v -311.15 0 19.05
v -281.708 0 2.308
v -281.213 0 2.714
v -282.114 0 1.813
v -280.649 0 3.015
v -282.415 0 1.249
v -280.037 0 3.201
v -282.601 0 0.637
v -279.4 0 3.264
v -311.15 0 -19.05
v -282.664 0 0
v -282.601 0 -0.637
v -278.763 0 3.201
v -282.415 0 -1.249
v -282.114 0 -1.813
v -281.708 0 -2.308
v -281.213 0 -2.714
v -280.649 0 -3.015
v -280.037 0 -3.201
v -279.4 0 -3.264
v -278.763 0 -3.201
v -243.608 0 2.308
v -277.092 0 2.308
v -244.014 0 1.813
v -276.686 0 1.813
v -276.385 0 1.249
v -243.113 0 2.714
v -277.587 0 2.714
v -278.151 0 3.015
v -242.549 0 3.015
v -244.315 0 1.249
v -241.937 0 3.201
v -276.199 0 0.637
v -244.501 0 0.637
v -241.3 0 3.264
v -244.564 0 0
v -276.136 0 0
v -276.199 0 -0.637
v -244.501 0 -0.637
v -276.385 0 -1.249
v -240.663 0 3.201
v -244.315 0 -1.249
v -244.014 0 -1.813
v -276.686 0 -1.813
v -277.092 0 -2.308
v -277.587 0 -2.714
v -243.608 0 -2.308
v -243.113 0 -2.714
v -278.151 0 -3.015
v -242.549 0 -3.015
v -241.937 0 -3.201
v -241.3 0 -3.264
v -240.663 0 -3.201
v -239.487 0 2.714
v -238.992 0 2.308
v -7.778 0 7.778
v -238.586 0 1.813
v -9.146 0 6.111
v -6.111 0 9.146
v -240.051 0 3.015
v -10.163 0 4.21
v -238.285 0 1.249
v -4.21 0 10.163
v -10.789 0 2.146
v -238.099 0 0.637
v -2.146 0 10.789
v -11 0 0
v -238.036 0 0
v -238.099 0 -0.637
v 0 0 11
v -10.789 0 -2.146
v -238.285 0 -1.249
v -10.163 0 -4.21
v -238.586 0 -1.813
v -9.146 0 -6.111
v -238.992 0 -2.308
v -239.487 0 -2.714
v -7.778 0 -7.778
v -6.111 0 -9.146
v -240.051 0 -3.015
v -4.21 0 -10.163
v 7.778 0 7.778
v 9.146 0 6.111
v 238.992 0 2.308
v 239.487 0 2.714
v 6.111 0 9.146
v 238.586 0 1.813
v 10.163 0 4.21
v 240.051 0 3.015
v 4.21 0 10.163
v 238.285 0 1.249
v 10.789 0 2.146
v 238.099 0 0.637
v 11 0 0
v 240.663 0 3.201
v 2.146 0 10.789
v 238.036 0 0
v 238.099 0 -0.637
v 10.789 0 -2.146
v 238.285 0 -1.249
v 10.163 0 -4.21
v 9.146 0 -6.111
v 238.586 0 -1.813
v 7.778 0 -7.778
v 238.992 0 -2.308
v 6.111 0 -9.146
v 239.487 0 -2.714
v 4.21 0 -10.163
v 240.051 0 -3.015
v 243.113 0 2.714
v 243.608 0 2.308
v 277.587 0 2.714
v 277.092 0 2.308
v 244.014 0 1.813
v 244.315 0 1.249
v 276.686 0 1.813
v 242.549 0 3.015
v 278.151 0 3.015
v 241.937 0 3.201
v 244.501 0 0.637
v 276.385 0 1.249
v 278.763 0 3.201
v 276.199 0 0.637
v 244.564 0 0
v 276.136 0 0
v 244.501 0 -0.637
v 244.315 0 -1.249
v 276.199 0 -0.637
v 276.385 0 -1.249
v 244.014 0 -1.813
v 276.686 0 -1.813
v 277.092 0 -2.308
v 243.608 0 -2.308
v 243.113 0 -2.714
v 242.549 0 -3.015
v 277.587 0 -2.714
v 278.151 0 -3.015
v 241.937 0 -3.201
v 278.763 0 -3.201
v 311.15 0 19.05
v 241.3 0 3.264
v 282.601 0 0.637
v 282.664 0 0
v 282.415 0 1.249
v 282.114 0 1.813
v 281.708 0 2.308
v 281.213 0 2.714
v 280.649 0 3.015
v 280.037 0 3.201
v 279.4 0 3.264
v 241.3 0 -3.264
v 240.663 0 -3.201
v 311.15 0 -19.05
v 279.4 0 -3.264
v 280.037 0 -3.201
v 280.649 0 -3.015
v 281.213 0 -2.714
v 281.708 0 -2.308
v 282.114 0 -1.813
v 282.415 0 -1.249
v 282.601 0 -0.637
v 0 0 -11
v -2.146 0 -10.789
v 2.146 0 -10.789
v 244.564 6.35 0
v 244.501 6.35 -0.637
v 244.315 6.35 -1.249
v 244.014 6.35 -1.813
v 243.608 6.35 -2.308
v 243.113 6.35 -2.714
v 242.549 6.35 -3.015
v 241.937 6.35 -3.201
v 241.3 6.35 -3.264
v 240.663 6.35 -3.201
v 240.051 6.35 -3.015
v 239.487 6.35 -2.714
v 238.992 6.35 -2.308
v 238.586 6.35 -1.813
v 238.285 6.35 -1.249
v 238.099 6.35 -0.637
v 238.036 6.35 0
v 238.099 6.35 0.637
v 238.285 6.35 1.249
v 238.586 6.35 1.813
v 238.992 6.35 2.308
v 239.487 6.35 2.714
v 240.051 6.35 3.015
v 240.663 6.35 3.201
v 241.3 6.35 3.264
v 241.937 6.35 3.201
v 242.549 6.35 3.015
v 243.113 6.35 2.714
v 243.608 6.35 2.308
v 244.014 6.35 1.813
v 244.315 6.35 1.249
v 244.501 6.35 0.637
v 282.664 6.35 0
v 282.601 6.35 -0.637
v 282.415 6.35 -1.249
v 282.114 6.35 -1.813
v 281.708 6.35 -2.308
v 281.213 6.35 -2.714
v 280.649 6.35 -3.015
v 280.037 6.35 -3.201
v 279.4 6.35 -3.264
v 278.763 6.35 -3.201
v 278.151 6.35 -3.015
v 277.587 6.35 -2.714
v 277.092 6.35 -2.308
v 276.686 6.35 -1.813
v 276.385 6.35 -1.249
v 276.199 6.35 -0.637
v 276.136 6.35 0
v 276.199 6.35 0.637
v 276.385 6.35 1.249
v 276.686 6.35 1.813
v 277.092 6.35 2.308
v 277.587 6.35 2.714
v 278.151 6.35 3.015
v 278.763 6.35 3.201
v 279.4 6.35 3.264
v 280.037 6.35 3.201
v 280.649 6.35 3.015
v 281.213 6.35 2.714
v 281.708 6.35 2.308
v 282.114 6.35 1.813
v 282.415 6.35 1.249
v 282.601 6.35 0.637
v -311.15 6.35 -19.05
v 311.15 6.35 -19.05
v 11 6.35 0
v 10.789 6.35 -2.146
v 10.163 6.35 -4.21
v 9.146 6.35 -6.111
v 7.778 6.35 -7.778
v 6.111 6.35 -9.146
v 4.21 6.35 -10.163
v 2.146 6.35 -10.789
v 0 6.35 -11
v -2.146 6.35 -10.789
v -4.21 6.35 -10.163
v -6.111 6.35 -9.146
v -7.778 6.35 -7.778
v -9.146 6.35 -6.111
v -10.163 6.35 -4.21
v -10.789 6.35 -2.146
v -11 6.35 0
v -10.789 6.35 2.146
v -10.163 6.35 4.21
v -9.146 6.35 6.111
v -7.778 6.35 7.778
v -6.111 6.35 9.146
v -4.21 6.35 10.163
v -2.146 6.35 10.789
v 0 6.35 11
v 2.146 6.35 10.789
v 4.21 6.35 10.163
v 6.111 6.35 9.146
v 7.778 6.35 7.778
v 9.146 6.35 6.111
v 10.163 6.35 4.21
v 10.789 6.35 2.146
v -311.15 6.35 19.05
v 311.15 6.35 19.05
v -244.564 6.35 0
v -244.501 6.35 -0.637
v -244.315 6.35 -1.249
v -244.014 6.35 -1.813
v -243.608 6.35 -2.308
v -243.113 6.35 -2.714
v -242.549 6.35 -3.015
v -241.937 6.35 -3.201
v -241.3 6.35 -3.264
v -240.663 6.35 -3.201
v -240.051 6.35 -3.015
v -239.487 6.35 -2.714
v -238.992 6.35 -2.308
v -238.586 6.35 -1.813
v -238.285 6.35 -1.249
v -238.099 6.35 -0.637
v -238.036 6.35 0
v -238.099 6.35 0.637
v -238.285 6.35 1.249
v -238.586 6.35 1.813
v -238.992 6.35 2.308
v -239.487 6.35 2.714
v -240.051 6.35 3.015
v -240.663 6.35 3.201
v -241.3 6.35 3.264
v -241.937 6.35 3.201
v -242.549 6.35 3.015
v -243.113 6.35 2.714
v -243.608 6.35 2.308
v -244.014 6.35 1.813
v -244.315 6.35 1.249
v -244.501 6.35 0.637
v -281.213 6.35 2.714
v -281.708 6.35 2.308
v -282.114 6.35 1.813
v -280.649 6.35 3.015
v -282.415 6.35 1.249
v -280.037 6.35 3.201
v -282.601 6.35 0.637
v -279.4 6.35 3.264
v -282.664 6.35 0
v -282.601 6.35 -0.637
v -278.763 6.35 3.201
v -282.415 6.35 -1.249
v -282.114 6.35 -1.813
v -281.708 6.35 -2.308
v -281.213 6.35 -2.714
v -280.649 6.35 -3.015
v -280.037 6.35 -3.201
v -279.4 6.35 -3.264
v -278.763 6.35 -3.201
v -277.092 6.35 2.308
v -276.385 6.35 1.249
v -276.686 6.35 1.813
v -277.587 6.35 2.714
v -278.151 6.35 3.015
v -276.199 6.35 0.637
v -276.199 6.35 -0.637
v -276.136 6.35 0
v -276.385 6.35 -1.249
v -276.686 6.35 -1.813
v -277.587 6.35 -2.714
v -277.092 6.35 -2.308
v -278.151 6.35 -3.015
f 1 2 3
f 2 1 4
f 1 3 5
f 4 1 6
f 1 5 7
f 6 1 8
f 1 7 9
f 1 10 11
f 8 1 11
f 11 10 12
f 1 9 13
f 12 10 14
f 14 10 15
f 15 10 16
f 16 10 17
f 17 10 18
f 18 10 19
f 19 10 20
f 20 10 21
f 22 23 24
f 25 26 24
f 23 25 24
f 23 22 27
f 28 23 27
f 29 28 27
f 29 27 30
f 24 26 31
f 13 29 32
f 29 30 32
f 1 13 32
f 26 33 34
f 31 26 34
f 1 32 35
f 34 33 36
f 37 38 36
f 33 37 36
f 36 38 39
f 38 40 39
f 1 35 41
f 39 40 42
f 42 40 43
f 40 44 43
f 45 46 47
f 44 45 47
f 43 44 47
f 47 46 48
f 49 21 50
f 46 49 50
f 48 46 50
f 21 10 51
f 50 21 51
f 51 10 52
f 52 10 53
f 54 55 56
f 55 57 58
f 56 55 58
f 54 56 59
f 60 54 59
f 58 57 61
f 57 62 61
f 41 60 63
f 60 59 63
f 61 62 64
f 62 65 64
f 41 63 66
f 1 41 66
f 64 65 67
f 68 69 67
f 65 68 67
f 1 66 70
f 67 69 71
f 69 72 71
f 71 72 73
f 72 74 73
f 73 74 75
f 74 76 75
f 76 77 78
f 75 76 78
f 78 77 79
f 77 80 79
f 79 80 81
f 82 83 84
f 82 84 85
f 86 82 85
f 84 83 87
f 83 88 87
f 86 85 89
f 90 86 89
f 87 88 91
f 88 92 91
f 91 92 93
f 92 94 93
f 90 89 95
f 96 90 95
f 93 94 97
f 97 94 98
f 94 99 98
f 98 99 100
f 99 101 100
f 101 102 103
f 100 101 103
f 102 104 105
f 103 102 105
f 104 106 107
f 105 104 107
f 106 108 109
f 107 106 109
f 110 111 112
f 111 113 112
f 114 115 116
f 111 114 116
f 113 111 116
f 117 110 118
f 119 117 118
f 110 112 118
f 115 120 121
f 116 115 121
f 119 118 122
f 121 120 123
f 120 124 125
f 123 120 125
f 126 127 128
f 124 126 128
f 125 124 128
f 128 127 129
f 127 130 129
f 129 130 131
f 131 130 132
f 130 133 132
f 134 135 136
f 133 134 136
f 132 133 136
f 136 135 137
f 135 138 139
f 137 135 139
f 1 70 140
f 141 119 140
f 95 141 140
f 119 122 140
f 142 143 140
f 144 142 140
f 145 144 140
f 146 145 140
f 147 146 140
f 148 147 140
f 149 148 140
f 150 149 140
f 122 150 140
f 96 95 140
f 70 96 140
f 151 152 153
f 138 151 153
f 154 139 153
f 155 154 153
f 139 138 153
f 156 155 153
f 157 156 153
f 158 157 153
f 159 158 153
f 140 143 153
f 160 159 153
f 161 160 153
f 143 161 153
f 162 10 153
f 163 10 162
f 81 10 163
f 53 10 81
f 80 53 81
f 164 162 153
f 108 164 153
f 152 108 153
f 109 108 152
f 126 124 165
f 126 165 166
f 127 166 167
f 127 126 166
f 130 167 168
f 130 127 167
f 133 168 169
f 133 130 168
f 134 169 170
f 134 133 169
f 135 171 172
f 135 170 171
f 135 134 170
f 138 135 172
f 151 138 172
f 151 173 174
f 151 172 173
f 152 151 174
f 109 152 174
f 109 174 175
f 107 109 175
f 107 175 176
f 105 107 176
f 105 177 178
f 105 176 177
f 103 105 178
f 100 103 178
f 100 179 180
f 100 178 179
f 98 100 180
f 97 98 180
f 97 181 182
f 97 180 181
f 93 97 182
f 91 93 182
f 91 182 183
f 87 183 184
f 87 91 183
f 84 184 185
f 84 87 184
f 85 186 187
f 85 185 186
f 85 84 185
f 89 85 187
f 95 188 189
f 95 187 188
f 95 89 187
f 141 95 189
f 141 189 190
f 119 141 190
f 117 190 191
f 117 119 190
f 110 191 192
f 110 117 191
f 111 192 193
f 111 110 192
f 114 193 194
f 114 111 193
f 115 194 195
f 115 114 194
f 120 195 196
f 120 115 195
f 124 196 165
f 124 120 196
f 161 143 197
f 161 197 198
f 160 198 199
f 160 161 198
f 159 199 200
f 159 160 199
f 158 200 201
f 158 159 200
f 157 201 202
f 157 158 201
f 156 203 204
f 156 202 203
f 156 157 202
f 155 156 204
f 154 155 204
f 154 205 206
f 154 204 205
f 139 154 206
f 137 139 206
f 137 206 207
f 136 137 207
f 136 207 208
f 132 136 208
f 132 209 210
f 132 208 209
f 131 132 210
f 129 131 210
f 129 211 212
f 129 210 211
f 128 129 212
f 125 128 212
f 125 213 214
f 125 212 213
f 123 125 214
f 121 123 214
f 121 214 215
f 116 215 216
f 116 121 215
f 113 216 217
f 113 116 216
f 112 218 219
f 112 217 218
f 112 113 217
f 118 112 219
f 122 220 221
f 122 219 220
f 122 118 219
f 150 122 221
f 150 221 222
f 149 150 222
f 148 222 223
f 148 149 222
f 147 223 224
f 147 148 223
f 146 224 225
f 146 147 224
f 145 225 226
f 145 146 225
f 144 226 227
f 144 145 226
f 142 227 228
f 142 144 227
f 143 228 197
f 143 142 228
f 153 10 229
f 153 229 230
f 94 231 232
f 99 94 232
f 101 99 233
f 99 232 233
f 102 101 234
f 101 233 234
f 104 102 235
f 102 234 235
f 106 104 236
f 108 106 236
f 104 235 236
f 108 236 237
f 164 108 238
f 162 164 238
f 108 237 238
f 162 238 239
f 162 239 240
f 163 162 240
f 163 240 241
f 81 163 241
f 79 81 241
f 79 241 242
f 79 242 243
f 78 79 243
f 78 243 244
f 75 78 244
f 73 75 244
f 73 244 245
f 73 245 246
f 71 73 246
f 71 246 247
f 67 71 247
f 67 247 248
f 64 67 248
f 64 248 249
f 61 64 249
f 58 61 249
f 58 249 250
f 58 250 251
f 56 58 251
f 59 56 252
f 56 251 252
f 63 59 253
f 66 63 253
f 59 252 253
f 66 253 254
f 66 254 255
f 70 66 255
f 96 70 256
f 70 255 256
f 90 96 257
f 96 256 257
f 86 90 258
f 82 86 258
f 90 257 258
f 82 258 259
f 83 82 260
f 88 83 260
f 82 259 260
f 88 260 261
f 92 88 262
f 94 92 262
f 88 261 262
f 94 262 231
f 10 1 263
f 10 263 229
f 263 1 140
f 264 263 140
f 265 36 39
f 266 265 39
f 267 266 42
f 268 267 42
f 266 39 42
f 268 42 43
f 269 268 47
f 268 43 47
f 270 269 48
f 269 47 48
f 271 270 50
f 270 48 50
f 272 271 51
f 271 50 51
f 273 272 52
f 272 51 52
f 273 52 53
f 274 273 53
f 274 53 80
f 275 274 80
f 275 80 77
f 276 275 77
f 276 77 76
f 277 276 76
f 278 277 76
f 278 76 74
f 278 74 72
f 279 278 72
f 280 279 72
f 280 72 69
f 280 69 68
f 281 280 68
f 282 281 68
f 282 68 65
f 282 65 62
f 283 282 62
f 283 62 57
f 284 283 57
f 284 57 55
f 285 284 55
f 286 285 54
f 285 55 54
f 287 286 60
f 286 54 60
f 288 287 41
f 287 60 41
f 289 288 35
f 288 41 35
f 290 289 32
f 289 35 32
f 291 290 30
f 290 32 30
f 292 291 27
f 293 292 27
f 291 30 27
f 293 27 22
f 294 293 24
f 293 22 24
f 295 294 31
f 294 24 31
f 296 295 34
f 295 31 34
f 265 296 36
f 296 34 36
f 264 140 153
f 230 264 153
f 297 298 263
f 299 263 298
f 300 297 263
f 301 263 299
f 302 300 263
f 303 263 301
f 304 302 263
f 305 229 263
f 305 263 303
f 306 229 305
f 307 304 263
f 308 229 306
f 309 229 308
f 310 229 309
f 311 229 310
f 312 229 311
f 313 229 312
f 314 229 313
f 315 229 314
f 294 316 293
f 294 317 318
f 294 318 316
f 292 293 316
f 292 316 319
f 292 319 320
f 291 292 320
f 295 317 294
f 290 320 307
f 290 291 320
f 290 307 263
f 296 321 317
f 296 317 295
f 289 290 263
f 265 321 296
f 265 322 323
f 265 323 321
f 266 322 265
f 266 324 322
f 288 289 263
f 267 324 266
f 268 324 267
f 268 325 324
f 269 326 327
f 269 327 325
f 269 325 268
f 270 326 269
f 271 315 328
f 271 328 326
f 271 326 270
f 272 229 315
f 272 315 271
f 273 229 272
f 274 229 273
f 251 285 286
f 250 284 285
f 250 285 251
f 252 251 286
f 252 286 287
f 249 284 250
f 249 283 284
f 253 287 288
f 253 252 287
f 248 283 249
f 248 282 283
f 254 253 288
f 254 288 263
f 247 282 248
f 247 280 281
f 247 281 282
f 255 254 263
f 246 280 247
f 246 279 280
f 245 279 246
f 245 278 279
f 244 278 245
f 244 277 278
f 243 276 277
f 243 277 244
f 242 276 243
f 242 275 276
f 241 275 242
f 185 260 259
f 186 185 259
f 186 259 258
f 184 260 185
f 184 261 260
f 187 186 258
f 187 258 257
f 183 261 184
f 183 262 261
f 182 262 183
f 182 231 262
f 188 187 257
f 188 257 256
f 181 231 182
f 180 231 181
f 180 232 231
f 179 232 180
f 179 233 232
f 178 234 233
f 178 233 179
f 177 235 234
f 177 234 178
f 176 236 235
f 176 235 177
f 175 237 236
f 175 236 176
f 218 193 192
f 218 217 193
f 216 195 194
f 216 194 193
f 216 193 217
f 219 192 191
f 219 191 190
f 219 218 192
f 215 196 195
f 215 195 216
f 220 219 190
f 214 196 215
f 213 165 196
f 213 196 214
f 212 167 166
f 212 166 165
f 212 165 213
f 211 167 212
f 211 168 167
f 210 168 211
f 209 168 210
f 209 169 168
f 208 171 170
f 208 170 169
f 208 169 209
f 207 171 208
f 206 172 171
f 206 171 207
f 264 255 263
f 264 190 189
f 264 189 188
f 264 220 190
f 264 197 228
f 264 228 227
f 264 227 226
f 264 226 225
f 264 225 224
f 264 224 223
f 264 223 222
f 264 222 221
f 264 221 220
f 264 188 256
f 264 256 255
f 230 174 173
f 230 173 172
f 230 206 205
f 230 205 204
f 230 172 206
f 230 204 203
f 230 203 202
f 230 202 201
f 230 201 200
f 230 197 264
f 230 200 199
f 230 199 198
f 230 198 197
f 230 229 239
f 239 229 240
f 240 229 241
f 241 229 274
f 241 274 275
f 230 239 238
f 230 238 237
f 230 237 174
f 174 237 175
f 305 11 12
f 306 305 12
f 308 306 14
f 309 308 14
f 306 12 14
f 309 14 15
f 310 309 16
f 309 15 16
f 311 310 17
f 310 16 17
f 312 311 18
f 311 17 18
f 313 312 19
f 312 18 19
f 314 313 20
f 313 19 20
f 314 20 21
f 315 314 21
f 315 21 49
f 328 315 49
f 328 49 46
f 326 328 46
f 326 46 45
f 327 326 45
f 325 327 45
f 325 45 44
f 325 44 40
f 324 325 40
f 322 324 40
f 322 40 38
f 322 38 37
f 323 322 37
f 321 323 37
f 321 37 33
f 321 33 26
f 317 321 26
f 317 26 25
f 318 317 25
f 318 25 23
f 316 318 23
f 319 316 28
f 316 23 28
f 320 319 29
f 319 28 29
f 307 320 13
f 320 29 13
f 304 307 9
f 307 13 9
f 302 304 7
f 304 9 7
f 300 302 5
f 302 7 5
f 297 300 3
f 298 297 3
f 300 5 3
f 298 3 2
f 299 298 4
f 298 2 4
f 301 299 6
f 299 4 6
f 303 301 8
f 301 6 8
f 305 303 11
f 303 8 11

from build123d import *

# Parameters (mm, degrees)
SKETCH1_W                = 622.3
SKETCH1_H                = 38.1
BOSS_EXTRUDE1_DEPTH      = 6.35
SKETCH2_R                = 11
CUT_EXTRUDE1_DEPTH       = 1
CUT_EXTRUDE1_DEPTH_BACK  = 7.62
F_0_257_DIAMETER_HOLE2_D = 6.5278


with BuildPart() as part:
    # Sketch1 → Boss-Extrude1 (new body)
    with BuildSketch(Plane(origin=(0, 0, 0), x_dir=(1, 0, 0), z_dir=(0, 1, 0))):
        Rectangle(SKETCH1_W, SKETCH1_H)
    extrude(amount=BOSS_EXTRUDE1_DEPTH)

    # Sketch2 → Cut-Extrude1 (cut, two sides)
    with BuildSketch(Plane(origin=(0, 6.35, 0), x_dir=(1, 0, 0), z_dir=(0, 1, 0))) as cut_extrude1_sk:
        Circle(SKETCH2_R)
    extrude(amount=CUT_EXTRUDE1_DEPTH, mode=Mode.SUBTRACT)
    extrude(cut_extrude1_sk.sketch, amount=-CUT_EXTRUDE1_DEPTH_BACK, mode=Mode.SUBTRACT)

    # F (0.257) Diameter Hole2 (through all)
    with Locations(Plane(origin=(0, 6.35, 0), x_dir=(1, 0, 0), z_dir=(0, 1, 0))):
        with Locations((-279.4, 0), (-241.3, 0)):
            f_0_257_diameter_hole2 = Hole(F_0_257_DIAMETER_HOLE2_D / 2)

    # Mirror1: F (0.257) Diameter Hole2 across plane
    add(f_0_257_diameter_hole2.mirror(Plane(origin=(0, 0, 0), x_dir=(0, 0, 1), z_dir=(1, 0, 0))), mode=Mode.SUBTRACT)


solid = part.part
